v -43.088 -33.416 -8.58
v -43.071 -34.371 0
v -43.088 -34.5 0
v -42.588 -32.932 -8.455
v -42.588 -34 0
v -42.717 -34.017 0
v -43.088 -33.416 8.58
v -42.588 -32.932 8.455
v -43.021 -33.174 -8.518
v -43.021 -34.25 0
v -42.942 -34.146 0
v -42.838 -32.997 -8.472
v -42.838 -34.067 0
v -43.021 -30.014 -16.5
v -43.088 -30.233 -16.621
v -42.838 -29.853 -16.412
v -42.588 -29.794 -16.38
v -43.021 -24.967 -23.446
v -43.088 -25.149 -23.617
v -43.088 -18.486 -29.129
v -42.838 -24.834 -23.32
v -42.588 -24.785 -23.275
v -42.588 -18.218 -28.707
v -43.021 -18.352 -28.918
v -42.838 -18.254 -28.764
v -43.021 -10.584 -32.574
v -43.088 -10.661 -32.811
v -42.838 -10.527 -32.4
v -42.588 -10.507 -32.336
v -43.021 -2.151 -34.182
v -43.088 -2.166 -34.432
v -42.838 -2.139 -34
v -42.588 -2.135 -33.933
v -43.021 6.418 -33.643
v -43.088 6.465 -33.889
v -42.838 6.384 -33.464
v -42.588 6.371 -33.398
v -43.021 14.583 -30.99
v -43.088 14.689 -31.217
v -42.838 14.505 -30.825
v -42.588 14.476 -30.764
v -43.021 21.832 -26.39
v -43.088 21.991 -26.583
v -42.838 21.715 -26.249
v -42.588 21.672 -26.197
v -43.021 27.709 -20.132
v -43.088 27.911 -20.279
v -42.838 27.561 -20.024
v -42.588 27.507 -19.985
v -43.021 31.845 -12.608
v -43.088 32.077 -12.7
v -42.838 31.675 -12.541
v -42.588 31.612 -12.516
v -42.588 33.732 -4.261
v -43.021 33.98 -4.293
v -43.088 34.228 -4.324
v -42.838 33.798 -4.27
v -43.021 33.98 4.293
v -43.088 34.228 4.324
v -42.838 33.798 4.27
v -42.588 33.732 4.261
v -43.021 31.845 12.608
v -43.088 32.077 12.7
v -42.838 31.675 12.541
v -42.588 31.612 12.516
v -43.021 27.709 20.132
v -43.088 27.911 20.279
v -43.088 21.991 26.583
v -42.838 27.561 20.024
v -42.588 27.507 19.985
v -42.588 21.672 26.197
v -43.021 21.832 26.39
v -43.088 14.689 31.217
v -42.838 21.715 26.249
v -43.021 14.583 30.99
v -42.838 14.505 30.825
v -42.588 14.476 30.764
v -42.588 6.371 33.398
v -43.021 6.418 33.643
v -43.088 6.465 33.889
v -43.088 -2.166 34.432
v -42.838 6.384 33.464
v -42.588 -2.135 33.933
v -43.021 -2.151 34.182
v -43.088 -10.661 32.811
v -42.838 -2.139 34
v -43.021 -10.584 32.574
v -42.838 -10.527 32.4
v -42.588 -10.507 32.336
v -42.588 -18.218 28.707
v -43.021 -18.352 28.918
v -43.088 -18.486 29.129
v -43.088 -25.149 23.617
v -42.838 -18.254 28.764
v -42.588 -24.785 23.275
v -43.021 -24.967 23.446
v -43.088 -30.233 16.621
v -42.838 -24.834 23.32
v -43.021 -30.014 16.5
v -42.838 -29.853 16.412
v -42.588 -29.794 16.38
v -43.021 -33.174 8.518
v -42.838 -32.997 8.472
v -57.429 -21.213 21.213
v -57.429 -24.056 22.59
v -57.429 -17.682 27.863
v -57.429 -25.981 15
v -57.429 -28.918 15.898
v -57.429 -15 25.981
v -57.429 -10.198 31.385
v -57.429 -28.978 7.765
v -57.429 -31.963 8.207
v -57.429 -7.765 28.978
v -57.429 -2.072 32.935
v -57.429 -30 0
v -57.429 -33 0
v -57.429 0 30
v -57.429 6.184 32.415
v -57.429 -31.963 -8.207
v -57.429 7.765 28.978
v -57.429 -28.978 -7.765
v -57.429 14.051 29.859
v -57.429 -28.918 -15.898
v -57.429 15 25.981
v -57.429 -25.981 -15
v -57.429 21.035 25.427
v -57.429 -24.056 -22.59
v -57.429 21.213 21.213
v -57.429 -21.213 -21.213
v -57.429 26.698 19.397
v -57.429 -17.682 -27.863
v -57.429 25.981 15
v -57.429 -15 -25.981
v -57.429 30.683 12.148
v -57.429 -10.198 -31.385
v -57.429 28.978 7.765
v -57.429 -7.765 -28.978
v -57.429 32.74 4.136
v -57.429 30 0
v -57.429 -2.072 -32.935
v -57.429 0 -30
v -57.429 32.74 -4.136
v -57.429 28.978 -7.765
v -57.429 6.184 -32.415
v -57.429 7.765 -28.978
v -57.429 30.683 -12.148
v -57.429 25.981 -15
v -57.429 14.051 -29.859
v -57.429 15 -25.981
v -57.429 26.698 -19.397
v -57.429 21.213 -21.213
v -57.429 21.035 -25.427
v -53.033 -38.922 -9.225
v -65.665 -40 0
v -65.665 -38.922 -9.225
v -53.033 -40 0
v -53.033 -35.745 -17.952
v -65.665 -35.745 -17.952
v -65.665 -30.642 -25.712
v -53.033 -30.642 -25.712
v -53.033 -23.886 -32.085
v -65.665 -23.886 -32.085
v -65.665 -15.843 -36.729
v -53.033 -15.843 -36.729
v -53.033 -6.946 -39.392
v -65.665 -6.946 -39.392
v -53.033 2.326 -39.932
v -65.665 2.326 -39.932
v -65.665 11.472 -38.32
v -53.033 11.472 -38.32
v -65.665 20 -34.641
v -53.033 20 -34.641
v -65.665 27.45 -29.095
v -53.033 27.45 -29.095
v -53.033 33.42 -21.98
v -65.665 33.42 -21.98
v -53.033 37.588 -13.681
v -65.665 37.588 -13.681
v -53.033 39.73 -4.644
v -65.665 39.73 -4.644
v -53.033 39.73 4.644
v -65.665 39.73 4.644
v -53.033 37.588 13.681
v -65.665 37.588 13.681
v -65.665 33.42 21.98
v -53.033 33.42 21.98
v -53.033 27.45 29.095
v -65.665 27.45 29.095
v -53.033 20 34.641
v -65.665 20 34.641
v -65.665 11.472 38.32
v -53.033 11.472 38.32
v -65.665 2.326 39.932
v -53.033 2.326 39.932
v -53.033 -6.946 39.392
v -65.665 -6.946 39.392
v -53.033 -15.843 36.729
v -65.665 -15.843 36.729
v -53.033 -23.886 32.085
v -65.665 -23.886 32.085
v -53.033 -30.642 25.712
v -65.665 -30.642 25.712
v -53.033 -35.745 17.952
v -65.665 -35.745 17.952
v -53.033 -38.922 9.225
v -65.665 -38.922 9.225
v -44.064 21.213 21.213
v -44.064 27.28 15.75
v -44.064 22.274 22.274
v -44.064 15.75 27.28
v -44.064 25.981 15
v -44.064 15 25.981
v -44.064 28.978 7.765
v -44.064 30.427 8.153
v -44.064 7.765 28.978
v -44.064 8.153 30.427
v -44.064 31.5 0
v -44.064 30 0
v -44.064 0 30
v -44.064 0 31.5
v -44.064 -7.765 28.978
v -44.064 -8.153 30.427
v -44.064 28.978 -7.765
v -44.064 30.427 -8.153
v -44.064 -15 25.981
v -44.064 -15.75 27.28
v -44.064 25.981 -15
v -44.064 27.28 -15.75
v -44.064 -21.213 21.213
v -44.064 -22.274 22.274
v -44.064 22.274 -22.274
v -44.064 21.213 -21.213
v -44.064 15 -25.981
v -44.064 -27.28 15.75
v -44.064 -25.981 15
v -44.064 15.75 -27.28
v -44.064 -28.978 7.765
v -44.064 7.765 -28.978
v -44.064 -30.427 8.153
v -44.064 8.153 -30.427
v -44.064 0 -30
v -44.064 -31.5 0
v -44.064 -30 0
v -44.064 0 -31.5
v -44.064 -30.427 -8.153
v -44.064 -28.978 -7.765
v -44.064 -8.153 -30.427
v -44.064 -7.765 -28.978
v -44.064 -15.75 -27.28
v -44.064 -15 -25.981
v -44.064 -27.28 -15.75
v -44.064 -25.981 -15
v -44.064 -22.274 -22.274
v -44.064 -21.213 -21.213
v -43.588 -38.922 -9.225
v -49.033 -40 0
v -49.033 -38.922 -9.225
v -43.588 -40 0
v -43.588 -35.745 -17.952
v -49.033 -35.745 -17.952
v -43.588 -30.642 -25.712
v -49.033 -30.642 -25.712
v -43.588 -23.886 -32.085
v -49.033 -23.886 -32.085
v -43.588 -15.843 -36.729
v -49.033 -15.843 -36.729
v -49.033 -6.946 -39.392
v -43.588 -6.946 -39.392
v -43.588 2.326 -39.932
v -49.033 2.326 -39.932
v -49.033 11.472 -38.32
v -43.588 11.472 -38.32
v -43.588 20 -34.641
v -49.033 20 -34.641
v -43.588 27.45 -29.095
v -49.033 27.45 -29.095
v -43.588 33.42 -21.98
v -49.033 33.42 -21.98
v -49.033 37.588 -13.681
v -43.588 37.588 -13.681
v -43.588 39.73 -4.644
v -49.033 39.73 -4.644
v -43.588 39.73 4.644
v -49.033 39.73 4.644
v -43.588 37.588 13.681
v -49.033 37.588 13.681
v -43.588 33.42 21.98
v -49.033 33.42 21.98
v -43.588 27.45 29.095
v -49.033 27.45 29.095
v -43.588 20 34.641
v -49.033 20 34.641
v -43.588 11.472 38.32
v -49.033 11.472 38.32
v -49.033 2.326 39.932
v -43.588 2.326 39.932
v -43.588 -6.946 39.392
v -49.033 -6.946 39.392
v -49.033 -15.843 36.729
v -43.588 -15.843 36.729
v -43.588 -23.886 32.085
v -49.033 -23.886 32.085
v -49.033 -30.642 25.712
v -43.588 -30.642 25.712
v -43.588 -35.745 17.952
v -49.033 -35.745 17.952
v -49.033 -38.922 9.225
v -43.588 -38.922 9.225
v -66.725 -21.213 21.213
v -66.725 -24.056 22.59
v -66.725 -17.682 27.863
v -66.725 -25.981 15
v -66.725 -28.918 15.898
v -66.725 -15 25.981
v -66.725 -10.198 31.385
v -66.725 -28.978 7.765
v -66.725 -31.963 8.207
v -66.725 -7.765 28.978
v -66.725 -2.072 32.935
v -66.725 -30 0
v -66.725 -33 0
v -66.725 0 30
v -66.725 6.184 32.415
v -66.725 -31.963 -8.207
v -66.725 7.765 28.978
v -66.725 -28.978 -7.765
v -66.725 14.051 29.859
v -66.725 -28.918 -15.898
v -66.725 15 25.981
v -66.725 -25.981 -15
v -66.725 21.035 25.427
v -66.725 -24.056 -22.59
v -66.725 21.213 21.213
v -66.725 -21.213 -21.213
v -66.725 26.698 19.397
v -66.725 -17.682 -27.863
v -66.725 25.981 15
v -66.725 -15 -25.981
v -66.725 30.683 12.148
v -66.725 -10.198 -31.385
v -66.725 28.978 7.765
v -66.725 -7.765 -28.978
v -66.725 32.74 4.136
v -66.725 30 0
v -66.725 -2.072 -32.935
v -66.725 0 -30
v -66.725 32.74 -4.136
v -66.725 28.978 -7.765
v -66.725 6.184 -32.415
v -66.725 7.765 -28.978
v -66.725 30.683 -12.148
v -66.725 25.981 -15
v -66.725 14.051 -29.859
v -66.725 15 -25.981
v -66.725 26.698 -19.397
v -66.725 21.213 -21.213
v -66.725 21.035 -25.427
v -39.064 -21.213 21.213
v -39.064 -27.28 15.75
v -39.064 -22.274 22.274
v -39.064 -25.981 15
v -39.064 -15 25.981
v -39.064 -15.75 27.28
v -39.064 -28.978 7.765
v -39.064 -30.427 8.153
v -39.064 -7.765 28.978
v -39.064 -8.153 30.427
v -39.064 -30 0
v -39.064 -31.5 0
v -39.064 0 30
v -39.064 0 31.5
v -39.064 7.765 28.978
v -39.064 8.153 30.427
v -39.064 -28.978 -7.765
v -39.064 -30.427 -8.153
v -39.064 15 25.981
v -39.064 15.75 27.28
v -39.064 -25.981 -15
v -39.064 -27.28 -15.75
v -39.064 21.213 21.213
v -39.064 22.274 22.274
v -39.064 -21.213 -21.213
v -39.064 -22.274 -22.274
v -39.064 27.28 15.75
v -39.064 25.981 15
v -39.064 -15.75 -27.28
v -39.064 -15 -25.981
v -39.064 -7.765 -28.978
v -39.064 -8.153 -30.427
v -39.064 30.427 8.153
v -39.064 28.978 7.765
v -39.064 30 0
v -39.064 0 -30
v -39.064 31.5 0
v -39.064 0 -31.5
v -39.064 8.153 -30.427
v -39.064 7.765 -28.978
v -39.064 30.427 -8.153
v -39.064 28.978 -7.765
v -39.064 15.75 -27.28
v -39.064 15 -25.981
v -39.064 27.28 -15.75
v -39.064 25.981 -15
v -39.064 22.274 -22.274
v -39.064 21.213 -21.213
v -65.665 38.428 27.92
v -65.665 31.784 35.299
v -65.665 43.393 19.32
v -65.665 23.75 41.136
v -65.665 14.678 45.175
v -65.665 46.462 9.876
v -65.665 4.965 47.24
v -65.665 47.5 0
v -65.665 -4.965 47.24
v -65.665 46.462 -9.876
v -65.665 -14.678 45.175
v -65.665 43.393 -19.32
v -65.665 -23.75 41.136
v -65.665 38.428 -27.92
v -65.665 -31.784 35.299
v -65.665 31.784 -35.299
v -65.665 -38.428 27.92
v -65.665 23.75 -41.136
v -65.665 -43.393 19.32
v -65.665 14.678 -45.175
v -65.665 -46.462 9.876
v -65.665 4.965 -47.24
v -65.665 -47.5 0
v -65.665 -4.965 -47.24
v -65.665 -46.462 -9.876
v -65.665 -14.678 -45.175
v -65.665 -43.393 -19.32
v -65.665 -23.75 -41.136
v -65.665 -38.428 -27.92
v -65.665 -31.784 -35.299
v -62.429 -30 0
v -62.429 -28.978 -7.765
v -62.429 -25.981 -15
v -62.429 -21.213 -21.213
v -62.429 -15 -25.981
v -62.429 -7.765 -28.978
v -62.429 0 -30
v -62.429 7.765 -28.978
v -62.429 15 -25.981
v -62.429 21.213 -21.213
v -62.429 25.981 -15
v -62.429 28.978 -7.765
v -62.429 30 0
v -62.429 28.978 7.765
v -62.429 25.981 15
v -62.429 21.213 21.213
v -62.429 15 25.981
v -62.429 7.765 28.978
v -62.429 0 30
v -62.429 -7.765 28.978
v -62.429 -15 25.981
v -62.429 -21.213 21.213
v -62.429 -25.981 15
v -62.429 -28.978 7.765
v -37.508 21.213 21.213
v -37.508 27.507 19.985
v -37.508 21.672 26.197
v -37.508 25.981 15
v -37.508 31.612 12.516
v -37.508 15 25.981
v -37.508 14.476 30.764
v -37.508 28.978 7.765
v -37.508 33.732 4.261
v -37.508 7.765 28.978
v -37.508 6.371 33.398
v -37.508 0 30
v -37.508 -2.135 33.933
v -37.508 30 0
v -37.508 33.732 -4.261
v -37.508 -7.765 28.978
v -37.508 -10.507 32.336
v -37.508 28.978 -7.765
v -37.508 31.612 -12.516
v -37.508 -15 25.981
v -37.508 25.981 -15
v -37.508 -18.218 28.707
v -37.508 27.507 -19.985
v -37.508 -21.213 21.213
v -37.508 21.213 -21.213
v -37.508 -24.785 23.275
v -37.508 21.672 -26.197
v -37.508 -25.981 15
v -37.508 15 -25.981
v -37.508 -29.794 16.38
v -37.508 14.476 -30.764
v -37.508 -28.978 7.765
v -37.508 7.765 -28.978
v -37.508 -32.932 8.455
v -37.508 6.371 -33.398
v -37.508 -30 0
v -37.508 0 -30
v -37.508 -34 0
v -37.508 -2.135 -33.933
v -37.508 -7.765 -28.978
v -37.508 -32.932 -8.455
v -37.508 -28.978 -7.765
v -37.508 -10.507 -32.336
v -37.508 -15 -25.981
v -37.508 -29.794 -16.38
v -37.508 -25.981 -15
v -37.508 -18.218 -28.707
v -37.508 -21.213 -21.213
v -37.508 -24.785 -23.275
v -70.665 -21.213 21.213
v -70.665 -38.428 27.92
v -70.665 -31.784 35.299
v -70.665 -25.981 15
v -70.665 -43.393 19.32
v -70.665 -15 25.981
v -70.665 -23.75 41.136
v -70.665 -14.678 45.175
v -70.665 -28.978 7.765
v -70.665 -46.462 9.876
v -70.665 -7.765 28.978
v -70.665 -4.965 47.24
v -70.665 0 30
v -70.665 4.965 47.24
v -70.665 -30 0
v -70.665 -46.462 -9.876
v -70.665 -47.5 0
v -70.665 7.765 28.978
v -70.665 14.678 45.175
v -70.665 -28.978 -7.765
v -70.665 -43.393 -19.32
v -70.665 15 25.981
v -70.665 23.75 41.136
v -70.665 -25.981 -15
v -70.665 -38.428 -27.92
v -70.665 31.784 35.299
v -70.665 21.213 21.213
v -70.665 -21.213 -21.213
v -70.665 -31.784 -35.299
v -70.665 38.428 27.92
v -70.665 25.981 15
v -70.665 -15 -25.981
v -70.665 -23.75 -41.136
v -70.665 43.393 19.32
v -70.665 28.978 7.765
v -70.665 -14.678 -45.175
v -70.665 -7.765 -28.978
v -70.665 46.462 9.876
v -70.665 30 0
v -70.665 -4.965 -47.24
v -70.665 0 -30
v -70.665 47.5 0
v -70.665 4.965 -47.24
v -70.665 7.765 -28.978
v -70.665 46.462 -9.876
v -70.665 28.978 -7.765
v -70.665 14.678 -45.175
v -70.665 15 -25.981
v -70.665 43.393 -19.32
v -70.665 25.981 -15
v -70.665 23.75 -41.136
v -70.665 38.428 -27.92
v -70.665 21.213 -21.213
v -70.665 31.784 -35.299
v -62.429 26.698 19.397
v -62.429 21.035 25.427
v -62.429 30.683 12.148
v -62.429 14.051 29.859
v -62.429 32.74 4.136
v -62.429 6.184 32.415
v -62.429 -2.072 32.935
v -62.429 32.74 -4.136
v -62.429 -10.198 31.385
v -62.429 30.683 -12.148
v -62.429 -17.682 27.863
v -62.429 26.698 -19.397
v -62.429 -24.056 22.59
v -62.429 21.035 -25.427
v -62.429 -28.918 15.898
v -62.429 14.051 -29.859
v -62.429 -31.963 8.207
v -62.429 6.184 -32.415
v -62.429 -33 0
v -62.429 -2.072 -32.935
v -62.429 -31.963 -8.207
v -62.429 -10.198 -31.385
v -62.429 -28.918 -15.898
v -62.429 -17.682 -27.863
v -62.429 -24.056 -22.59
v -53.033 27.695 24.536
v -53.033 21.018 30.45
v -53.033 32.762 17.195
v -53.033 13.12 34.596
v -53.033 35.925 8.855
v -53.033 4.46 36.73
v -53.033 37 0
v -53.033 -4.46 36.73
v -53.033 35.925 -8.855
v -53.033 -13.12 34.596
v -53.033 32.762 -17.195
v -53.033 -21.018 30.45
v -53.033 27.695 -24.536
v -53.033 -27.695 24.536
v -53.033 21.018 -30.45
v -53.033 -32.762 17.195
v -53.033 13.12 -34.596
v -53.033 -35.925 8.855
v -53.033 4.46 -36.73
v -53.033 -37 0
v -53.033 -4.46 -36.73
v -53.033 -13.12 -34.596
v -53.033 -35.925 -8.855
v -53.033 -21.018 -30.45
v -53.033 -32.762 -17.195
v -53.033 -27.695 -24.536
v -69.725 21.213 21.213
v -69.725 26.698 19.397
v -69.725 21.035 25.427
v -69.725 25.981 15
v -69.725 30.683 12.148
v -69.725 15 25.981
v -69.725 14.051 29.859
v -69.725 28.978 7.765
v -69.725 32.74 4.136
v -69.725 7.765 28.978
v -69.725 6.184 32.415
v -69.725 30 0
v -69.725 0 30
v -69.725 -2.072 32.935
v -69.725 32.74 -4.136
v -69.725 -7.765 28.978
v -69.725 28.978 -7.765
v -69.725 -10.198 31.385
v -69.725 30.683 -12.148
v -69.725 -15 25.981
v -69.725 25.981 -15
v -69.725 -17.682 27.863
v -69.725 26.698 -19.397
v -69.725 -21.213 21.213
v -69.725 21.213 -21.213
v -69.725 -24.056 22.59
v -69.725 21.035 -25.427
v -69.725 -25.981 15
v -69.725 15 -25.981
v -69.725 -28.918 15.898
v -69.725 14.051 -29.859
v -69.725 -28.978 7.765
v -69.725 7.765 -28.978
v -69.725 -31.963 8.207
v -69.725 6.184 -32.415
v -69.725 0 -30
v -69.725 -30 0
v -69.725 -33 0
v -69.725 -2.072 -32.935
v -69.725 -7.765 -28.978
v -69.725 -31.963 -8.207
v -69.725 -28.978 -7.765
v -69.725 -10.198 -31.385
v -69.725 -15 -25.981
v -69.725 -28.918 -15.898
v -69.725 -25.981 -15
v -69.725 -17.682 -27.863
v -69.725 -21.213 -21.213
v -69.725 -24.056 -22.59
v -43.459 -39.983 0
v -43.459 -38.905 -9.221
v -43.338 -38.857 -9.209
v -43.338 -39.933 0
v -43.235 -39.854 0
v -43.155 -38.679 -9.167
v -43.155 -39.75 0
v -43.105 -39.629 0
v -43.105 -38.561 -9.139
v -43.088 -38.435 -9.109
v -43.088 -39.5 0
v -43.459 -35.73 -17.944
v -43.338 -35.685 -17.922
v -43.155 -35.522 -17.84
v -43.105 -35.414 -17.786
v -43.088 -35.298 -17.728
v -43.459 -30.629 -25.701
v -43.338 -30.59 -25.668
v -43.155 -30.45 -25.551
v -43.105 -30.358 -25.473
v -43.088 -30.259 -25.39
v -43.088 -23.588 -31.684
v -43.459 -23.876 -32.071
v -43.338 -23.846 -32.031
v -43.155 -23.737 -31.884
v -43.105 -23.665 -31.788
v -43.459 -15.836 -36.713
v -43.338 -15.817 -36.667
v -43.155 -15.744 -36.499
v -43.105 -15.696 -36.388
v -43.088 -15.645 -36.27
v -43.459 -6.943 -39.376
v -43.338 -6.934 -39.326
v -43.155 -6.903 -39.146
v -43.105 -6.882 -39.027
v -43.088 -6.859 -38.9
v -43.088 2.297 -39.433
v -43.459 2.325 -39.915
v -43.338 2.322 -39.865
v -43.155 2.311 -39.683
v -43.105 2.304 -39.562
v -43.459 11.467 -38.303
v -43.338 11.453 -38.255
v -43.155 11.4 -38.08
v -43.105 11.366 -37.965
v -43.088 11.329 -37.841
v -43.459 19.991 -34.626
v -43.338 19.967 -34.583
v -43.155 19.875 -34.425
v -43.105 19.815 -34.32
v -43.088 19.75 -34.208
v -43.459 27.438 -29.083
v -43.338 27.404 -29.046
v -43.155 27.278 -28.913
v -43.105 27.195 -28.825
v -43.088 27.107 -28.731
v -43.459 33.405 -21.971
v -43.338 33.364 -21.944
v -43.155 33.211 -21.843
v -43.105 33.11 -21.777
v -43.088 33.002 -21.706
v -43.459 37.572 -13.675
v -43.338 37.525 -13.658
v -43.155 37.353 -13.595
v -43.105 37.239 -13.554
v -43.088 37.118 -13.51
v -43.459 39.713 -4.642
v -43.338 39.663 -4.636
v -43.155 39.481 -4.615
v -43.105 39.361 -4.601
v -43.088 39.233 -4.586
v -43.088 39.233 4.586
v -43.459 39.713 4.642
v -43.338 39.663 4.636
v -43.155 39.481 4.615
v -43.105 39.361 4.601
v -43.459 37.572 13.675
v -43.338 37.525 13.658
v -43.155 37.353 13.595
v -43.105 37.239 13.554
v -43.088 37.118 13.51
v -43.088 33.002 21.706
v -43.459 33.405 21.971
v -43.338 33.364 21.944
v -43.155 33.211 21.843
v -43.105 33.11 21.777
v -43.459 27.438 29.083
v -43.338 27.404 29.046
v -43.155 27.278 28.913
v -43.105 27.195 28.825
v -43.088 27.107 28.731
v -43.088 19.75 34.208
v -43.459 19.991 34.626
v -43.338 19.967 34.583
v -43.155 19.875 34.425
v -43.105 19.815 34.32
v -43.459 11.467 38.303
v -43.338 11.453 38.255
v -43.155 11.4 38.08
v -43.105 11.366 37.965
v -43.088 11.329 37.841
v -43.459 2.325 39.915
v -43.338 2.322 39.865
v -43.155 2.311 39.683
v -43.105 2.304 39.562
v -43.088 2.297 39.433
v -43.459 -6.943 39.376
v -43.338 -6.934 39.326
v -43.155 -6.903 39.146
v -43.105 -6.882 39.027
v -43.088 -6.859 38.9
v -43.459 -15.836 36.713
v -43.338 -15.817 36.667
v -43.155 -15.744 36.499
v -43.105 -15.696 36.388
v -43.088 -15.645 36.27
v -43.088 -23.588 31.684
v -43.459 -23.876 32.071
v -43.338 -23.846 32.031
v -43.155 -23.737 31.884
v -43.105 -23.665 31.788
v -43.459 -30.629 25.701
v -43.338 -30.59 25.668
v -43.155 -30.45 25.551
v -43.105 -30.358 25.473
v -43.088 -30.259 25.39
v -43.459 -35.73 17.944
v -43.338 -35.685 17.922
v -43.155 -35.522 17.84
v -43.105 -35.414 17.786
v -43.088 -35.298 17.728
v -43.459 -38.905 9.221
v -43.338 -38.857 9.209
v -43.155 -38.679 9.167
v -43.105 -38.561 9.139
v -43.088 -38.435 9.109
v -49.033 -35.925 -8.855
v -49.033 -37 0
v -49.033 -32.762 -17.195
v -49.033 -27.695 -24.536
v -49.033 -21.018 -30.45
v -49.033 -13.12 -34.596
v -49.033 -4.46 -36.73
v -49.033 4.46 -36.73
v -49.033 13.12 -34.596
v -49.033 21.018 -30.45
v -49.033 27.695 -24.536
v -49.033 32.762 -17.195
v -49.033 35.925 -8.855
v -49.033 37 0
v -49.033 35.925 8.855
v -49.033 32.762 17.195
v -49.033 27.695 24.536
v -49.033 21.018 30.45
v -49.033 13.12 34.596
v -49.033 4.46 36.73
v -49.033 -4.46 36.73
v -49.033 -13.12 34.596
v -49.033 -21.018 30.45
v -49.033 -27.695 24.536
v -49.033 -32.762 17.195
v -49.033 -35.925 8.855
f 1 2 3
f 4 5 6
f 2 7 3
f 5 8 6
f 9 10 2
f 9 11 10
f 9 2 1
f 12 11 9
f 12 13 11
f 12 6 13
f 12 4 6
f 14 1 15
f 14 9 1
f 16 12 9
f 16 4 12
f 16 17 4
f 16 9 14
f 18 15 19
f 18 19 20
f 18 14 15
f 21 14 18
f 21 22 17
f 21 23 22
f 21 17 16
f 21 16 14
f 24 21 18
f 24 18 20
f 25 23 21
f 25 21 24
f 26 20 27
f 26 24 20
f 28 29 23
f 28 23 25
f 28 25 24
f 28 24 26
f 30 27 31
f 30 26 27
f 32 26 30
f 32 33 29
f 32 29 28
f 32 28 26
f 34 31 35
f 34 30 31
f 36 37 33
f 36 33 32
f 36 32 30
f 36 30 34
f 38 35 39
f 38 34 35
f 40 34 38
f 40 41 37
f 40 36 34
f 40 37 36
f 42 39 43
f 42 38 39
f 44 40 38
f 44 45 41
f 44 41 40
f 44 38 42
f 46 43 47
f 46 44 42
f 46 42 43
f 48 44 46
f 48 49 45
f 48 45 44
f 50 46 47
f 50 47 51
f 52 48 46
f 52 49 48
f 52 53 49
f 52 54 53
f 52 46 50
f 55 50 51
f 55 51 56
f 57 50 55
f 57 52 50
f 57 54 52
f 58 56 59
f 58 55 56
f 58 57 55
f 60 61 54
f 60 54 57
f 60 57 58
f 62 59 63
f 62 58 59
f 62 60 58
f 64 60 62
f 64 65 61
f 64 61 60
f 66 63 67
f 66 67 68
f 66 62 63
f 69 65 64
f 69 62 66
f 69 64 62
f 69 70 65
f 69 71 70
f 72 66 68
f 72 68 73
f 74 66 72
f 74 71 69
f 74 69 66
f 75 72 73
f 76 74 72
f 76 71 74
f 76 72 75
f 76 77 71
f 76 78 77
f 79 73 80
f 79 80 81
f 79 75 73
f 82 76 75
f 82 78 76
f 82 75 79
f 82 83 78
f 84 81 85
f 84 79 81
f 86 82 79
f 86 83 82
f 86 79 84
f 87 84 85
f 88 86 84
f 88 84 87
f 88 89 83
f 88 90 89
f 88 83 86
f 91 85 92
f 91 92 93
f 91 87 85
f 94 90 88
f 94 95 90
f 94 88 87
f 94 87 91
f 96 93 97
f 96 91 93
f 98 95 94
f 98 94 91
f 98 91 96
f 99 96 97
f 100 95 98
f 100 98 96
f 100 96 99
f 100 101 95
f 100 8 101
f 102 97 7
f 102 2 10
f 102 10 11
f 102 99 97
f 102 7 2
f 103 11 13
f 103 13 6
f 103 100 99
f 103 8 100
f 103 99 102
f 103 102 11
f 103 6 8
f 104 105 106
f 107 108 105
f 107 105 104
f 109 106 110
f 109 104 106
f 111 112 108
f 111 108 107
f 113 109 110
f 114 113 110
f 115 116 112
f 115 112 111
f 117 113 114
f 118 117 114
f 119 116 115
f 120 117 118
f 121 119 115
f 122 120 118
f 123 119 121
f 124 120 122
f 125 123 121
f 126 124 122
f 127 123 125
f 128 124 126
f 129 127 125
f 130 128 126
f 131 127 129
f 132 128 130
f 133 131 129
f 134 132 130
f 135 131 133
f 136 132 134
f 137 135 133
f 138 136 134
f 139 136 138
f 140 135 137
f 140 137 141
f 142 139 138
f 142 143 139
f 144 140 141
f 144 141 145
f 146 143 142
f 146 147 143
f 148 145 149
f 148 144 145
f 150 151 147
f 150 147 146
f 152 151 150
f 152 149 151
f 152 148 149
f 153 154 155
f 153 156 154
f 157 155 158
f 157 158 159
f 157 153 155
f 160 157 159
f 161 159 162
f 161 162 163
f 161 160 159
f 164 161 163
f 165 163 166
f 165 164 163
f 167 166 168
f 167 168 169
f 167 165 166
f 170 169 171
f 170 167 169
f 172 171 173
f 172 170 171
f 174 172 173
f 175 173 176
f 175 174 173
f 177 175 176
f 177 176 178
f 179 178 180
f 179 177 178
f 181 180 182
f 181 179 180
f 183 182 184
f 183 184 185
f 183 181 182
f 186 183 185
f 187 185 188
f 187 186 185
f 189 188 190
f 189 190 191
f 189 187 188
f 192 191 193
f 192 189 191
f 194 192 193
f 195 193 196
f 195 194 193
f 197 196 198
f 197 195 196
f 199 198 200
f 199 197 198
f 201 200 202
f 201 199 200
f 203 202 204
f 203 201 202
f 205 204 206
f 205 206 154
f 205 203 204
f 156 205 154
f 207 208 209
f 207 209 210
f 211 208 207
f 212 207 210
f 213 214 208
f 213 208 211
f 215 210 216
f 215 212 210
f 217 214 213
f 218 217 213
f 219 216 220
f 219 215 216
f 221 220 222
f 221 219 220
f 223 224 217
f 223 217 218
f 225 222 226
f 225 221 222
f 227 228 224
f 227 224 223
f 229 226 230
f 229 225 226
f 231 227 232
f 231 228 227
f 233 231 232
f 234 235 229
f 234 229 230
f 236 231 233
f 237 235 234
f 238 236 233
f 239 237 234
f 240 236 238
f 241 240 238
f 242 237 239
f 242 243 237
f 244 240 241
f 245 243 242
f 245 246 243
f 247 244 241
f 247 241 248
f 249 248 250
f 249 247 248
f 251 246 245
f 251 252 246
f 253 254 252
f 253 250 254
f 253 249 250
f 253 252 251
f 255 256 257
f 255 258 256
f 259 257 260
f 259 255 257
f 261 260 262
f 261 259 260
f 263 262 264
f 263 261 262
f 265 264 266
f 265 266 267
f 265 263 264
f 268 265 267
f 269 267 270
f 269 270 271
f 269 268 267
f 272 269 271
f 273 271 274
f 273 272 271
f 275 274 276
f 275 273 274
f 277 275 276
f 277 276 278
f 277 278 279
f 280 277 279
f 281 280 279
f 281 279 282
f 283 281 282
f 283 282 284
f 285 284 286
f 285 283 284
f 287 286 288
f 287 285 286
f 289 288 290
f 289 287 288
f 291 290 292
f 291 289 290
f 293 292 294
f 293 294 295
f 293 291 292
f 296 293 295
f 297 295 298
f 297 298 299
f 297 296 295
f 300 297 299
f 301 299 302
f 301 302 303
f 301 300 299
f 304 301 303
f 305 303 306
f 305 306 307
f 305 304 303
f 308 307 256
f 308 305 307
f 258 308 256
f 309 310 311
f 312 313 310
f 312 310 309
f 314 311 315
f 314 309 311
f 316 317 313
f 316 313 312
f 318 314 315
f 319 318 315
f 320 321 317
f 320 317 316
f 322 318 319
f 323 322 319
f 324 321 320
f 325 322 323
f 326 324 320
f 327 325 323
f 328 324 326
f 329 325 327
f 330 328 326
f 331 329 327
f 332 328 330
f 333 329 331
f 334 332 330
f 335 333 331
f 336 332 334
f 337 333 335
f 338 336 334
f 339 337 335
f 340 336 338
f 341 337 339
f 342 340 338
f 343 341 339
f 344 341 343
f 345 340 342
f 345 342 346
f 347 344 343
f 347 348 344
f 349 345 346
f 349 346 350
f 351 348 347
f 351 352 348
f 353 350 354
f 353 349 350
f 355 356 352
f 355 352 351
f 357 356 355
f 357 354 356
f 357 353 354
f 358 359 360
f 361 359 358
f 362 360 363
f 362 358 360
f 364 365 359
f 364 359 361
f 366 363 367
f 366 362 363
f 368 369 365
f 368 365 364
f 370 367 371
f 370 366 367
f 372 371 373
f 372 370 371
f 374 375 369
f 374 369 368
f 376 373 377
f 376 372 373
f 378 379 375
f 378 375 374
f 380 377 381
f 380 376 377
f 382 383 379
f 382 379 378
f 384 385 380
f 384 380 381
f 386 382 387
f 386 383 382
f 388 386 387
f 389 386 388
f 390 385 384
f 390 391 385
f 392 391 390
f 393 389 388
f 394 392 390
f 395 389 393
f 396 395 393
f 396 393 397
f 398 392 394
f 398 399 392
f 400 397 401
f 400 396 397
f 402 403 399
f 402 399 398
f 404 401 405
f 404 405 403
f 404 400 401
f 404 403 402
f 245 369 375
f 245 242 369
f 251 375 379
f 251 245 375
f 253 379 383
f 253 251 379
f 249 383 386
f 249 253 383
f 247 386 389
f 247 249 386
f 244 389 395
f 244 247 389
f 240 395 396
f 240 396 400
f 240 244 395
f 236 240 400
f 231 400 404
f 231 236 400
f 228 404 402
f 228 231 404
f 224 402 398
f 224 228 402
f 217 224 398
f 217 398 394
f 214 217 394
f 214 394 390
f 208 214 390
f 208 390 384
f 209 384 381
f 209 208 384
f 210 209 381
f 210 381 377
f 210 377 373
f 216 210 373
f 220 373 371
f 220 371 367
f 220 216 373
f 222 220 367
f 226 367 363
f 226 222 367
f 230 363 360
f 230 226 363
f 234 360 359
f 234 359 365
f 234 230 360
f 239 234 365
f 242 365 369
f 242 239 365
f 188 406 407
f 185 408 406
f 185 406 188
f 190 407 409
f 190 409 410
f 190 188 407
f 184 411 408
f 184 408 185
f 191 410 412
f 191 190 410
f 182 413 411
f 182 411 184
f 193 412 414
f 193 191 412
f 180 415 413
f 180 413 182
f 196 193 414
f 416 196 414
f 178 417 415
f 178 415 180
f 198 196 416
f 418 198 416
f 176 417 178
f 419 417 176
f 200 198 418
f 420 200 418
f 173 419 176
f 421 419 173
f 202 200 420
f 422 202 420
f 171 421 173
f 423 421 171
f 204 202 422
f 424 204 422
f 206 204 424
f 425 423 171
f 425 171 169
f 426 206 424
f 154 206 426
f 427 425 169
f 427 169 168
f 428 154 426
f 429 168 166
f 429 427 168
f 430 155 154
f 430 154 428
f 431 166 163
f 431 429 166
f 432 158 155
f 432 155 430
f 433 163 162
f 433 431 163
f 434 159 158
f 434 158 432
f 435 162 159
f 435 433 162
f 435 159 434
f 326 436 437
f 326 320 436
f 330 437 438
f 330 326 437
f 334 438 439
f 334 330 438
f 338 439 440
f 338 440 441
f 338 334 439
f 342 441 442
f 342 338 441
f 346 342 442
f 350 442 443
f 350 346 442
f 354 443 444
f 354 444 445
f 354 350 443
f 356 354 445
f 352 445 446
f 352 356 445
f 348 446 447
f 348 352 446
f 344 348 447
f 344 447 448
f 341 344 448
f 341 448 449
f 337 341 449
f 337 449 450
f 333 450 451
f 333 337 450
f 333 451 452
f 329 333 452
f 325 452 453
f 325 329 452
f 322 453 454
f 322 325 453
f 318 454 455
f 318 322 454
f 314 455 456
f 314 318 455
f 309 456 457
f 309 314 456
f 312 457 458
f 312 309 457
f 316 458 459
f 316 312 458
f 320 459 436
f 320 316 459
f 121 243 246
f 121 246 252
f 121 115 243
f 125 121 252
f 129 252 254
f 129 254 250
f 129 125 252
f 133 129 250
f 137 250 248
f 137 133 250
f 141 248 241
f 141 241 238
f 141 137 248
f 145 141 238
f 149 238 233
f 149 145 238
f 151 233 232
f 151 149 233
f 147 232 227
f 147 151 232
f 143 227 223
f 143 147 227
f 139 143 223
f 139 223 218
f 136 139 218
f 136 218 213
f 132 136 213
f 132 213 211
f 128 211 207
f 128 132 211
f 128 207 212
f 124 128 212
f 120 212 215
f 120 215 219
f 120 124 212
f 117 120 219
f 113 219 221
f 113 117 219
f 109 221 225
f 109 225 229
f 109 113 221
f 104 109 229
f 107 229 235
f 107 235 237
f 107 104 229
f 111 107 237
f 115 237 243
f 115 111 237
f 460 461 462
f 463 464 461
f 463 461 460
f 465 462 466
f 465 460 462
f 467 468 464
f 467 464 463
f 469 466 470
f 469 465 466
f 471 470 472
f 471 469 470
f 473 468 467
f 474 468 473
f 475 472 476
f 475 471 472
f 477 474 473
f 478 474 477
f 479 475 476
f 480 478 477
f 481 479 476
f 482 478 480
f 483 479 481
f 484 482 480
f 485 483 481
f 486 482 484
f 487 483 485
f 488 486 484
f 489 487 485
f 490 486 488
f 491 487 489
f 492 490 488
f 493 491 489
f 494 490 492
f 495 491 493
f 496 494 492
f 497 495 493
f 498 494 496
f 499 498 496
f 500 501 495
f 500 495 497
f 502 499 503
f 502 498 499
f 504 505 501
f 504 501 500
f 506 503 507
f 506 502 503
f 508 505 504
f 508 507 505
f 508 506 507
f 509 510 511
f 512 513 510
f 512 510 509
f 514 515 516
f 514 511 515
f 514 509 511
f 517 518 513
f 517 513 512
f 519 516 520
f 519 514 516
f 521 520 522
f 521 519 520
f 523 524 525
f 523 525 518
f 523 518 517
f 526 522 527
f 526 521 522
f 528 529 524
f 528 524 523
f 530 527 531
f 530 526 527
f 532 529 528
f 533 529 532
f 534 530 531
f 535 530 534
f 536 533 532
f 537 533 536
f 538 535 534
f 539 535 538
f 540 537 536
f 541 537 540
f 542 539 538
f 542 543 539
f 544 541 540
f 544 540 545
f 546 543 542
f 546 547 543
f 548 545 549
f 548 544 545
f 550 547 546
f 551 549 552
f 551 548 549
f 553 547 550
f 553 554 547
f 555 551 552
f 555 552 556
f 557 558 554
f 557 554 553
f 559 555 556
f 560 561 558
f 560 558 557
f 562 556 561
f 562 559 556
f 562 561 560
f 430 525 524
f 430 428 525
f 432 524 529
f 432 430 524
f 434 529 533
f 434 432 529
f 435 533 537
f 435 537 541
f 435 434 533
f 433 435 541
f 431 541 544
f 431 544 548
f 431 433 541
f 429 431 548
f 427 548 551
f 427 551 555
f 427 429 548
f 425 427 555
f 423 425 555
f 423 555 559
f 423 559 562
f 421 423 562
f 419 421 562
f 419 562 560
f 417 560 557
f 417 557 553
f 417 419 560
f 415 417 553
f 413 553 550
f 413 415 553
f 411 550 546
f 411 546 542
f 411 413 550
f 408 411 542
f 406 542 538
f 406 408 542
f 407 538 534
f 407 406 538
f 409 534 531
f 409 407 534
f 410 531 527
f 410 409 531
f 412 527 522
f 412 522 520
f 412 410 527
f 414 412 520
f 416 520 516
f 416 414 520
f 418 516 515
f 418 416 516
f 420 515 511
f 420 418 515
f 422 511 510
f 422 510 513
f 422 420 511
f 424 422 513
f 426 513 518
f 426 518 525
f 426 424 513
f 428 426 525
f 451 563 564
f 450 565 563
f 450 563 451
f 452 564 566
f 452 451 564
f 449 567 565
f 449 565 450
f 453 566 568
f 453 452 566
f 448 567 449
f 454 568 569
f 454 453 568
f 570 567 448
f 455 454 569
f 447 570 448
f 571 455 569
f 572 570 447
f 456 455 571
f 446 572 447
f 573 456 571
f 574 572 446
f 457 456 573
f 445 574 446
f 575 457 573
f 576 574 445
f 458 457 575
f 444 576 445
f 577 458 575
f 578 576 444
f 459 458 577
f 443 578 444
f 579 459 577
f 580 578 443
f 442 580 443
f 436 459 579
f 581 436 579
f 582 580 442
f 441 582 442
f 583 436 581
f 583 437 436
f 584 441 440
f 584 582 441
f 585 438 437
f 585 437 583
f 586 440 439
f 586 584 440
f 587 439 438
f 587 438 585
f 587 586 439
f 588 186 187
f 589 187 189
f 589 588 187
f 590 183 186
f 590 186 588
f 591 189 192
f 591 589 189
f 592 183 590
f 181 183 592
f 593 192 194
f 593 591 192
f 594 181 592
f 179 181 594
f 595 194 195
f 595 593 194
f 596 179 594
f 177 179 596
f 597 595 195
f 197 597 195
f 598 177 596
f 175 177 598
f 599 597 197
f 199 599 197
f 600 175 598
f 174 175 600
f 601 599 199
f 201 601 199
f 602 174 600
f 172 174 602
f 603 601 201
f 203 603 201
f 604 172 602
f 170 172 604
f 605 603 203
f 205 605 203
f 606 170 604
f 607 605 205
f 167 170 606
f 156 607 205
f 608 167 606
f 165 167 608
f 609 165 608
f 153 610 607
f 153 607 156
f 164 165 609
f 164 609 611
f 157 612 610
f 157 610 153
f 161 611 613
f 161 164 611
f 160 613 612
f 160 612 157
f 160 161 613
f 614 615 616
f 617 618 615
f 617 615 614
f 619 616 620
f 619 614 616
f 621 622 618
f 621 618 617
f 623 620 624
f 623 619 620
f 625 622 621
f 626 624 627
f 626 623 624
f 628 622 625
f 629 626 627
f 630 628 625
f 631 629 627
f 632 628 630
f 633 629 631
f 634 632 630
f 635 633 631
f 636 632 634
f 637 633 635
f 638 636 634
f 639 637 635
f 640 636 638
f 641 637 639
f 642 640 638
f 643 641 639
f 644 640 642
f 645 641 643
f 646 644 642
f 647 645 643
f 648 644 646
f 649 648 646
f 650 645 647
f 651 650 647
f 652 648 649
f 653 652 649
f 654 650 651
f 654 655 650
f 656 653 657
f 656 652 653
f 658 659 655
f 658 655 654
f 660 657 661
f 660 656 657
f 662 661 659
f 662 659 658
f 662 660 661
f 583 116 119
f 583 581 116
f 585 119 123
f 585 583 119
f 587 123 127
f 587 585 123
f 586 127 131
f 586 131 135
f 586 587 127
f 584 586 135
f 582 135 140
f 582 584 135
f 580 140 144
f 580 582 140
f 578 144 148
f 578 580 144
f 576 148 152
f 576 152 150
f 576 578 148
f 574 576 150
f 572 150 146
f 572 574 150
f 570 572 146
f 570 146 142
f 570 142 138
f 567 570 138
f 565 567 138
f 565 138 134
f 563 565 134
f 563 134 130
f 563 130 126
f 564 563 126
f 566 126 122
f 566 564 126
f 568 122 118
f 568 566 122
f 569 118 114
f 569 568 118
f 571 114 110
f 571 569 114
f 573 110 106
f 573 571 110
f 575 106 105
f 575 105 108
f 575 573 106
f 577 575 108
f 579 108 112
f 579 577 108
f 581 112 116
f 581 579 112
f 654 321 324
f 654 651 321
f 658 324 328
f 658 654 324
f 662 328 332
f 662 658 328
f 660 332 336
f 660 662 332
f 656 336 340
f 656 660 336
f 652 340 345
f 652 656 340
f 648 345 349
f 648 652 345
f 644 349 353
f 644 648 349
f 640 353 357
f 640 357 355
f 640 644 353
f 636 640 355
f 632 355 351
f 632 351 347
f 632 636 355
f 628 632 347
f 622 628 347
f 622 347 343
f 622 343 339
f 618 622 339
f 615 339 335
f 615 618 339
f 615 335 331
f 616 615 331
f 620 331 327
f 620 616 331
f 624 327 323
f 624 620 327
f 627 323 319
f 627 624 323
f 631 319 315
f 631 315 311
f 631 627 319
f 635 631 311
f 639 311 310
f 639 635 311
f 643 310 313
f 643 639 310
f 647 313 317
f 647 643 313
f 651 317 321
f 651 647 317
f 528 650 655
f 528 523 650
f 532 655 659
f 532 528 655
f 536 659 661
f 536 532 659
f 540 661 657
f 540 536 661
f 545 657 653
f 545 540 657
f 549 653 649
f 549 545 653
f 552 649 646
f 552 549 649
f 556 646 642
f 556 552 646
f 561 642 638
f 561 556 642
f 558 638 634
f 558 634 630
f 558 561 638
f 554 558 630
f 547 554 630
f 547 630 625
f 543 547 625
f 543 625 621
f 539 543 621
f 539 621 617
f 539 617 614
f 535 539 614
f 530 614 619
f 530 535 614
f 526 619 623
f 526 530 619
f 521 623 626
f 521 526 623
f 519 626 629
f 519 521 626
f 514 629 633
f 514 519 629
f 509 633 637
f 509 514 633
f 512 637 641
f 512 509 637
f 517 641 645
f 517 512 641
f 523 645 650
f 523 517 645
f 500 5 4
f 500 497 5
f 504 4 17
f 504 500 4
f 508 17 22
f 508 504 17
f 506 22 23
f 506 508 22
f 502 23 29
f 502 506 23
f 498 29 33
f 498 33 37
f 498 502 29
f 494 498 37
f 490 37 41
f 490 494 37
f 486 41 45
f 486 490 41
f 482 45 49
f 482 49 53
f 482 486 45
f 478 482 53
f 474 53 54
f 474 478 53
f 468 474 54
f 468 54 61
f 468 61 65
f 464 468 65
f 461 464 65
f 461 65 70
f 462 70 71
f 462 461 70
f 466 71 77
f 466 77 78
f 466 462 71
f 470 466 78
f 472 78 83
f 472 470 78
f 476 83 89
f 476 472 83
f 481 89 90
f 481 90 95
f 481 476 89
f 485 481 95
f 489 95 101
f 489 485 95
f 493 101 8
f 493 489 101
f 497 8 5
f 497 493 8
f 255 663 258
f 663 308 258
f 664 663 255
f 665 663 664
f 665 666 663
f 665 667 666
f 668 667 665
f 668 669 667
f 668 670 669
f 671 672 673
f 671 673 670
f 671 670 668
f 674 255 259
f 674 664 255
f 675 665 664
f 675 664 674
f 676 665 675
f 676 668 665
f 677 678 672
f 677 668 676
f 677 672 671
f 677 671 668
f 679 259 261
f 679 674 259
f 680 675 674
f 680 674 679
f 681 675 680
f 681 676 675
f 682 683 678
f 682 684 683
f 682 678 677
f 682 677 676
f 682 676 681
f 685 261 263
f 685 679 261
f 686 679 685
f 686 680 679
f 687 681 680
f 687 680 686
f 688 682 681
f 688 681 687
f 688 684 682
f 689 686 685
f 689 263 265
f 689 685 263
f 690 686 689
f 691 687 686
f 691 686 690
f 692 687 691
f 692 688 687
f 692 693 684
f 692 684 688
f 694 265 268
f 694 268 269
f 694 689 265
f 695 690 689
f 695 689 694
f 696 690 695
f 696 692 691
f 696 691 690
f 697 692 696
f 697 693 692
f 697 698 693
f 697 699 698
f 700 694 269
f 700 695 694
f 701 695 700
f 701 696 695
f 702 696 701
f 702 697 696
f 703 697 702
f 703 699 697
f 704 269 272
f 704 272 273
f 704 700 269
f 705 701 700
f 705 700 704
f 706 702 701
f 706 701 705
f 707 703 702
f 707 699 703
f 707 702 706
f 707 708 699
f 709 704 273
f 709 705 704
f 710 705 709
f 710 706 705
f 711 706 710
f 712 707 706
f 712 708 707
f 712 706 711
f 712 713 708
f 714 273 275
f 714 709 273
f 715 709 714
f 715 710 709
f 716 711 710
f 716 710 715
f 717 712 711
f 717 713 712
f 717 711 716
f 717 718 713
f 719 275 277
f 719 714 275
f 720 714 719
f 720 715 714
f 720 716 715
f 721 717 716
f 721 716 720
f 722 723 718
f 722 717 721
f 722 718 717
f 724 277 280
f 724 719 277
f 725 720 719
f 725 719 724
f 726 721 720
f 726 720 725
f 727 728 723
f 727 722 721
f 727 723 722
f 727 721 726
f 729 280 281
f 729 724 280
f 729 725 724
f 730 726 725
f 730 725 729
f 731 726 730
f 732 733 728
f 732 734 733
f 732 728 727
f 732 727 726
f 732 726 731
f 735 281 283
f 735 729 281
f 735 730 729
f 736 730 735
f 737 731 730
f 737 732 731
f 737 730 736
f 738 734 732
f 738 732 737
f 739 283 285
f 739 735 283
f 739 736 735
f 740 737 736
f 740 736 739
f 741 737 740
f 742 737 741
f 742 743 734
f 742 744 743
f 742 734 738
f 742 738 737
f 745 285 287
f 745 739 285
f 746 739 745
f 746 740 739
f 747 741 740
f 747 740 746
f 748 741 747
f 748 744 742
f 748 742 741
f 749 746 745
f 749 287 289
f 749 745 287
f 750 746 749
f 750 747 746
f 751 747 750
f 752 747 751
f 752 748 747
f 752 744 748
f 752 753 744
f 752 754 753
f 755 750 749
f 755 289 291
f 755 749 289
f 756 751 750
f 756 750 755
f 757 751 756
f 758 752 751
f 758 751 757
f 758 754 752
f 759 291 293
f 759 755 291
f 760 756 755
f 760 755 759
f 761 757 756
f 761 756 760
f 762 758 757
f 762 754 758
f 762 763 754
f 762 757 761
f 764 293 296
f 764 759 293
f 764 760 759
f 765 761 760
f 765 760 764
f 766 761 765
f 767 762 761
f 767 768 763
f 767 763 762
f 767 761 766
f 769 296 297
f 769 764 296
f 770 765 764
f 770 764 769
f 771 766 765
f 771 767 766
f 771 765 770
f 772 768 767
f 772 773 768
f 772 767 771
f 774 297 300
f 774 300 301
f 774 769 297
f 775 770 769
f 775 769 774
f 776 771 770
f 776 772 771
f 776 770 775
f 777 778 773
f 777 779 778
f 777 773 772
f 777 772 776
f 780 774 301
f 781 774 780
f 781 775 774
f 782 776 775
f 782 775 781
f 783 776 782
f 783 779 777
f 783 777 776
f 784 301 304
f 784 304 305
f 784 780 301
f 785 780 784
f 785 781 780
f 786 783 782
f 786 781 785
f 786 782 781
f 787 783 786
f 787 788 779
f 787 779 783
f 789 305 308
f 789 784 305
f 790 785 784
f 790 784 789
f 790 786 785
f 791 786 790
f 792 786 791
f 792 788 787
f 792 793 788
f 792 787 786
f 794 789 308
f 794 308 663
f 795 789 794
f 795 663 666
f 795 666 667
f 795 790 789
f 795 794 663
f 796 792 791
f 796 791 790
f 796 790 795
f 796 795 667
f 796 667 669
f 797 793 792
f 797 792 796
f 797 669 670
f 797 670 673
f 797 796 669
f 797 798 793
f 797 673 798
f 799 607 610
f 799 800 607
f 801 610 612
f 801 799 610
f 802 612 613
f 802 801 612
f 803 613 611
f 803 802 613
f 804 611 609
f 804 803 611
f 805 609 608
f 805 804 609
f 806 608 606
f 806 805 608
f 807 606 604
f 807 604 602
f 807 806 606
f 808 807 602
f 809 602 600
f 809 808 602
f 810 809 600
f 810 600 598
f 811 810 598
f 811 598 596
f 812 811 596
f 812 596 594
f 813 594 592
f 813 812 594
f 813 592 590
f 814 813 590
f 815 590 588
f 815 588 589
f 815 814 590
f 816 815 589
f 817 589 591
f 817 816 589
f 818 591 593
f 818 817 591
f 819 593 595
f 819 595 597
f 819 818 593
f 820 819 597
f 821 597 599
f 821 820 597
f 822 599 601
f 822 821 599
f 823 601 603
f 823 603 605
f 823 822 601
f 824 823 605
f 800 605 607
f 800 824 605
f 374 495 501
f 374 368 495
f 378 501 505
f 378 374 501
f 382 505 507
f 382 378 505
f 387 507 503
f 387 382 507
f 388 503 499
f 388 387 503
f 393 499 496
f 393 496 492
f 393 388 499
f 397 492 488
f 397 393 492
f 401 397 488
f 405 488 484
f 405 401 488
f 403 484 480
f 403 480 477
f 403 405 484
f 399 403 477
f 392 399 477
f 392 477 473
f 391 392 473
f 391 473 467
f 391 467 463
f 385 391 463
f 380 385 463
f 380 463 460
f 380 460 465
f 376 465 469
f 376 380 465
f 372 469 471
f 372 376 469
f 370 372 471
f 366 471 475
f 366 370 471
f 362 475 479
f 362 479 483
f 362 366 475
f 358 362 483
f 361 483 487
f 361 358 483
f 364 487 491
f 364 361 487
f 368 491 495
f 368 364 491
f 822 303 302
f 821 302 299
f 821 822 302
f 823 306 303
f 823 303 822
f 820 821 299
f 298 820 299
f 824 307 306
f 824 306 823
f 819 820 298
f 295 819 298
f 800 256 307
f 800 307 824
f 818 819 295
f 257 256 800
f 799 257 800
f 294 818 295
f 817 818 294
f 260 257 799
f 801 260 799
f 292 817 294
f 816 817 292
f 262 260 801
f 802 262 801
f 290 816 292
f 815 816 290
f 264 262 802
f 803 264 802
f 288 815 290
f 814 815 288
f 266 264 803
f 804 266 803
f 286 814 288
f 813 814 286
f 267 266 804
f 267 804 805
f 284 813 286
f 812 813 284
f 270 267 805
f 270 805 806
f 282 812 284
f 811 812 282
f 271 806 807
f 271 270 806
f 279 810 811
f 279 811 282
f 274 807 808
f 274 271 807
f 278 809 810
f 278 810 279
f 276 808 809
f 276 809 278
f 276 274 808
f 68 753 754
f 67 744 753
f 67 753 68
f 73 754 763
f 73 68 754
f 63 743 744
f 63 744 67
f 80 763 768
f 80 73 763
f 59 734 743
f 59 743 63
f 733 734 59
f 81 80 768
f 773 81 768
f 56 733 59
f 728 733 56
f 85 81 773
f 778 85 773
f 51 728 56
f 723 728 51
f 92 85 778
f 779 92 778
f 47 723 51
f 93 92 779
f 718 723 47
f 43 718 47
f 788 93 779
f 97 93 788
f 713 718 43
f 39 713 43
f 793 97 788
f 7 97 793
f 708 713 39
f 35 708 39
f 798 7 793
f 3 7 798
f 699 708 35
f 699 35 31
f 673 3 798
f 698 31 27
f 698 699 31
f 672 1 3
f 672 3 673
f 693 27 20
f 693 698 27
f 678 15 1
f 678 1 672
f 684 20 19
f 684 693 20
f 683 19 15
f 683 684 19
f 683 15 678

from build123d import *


with BuildPart() as part:
    # Sketch1 → Revolve1 (revolve)
    with BuildSketch(Plane.XY):
        with BuildLine():
            Line((-70.664700289, -47.5), (-65.664700289, -47.5))
            Line((-65.664700289, -47.5), (-65.664700289, -40))
            Line((-65.664700289, -40), (-53.033215522, -40))
            Line((-53.033215522, -40), (-53.033215522, -37))
            Line((-53.033215522, -37), (-49.033215522, -37))
            Line((-49.033215522, -37), (-49.033215522, -40))
            Line((-49.033215522, -40), (-43.588058898, -40))
            ThreePointArc((-43.588058898, -40), (-43.234505508, -39.853553391), (-43.088058898, -39.5))
            Line((-43.088058898, -39.5), (-43.088058898, -34.5))
            ThreePointArc((-43.088058898, -34.5), (-42.941612289, -34.146446609), (-42.588058898, -34))
            Line((-42.588058898, -34), (-37.50828788, -34))
            Line((-37.50828788, -34), (-37.50828788, -30))
            Line((-37.50828788, -30), (-39.064374409, -30))
            Line((-39.064374409, -30), (-39.064374409, -31.5))
            Line((-39.064374409, -31.5), (-44.064374409, -31.5))
            Line((-44.064374409, -31.5), (-44.064374409, -30))
            Line((-44.064374409, -30), (-57.429010066, -30))
            Line((-57.429010066, -30), (-57.429010066, -33))
            Line((-57.429010066, -33), (-62.429010066, -33))
            Line((-62.429010066, -33), (-62.429010066, -30))
            Line((-62.429010066, -30), (-66.725082253, -30))
            Line((-66.725082253, -30), (-66.725082253, -33))
            Line((-66.725082253, -33), (-69.725082253, -33))
            Line((-69.725082253, -33), (-69.725082253, -30))
            Line((-69.725082253, -30), (-70.664700289, -30))
            Line((-70.664700289, -30), (-70.664700289, -47.5))
        make_face()
    revolve(axis=Axis((-81.578167515, 0, 0), (1, 0, 0)))


solid = part.part
